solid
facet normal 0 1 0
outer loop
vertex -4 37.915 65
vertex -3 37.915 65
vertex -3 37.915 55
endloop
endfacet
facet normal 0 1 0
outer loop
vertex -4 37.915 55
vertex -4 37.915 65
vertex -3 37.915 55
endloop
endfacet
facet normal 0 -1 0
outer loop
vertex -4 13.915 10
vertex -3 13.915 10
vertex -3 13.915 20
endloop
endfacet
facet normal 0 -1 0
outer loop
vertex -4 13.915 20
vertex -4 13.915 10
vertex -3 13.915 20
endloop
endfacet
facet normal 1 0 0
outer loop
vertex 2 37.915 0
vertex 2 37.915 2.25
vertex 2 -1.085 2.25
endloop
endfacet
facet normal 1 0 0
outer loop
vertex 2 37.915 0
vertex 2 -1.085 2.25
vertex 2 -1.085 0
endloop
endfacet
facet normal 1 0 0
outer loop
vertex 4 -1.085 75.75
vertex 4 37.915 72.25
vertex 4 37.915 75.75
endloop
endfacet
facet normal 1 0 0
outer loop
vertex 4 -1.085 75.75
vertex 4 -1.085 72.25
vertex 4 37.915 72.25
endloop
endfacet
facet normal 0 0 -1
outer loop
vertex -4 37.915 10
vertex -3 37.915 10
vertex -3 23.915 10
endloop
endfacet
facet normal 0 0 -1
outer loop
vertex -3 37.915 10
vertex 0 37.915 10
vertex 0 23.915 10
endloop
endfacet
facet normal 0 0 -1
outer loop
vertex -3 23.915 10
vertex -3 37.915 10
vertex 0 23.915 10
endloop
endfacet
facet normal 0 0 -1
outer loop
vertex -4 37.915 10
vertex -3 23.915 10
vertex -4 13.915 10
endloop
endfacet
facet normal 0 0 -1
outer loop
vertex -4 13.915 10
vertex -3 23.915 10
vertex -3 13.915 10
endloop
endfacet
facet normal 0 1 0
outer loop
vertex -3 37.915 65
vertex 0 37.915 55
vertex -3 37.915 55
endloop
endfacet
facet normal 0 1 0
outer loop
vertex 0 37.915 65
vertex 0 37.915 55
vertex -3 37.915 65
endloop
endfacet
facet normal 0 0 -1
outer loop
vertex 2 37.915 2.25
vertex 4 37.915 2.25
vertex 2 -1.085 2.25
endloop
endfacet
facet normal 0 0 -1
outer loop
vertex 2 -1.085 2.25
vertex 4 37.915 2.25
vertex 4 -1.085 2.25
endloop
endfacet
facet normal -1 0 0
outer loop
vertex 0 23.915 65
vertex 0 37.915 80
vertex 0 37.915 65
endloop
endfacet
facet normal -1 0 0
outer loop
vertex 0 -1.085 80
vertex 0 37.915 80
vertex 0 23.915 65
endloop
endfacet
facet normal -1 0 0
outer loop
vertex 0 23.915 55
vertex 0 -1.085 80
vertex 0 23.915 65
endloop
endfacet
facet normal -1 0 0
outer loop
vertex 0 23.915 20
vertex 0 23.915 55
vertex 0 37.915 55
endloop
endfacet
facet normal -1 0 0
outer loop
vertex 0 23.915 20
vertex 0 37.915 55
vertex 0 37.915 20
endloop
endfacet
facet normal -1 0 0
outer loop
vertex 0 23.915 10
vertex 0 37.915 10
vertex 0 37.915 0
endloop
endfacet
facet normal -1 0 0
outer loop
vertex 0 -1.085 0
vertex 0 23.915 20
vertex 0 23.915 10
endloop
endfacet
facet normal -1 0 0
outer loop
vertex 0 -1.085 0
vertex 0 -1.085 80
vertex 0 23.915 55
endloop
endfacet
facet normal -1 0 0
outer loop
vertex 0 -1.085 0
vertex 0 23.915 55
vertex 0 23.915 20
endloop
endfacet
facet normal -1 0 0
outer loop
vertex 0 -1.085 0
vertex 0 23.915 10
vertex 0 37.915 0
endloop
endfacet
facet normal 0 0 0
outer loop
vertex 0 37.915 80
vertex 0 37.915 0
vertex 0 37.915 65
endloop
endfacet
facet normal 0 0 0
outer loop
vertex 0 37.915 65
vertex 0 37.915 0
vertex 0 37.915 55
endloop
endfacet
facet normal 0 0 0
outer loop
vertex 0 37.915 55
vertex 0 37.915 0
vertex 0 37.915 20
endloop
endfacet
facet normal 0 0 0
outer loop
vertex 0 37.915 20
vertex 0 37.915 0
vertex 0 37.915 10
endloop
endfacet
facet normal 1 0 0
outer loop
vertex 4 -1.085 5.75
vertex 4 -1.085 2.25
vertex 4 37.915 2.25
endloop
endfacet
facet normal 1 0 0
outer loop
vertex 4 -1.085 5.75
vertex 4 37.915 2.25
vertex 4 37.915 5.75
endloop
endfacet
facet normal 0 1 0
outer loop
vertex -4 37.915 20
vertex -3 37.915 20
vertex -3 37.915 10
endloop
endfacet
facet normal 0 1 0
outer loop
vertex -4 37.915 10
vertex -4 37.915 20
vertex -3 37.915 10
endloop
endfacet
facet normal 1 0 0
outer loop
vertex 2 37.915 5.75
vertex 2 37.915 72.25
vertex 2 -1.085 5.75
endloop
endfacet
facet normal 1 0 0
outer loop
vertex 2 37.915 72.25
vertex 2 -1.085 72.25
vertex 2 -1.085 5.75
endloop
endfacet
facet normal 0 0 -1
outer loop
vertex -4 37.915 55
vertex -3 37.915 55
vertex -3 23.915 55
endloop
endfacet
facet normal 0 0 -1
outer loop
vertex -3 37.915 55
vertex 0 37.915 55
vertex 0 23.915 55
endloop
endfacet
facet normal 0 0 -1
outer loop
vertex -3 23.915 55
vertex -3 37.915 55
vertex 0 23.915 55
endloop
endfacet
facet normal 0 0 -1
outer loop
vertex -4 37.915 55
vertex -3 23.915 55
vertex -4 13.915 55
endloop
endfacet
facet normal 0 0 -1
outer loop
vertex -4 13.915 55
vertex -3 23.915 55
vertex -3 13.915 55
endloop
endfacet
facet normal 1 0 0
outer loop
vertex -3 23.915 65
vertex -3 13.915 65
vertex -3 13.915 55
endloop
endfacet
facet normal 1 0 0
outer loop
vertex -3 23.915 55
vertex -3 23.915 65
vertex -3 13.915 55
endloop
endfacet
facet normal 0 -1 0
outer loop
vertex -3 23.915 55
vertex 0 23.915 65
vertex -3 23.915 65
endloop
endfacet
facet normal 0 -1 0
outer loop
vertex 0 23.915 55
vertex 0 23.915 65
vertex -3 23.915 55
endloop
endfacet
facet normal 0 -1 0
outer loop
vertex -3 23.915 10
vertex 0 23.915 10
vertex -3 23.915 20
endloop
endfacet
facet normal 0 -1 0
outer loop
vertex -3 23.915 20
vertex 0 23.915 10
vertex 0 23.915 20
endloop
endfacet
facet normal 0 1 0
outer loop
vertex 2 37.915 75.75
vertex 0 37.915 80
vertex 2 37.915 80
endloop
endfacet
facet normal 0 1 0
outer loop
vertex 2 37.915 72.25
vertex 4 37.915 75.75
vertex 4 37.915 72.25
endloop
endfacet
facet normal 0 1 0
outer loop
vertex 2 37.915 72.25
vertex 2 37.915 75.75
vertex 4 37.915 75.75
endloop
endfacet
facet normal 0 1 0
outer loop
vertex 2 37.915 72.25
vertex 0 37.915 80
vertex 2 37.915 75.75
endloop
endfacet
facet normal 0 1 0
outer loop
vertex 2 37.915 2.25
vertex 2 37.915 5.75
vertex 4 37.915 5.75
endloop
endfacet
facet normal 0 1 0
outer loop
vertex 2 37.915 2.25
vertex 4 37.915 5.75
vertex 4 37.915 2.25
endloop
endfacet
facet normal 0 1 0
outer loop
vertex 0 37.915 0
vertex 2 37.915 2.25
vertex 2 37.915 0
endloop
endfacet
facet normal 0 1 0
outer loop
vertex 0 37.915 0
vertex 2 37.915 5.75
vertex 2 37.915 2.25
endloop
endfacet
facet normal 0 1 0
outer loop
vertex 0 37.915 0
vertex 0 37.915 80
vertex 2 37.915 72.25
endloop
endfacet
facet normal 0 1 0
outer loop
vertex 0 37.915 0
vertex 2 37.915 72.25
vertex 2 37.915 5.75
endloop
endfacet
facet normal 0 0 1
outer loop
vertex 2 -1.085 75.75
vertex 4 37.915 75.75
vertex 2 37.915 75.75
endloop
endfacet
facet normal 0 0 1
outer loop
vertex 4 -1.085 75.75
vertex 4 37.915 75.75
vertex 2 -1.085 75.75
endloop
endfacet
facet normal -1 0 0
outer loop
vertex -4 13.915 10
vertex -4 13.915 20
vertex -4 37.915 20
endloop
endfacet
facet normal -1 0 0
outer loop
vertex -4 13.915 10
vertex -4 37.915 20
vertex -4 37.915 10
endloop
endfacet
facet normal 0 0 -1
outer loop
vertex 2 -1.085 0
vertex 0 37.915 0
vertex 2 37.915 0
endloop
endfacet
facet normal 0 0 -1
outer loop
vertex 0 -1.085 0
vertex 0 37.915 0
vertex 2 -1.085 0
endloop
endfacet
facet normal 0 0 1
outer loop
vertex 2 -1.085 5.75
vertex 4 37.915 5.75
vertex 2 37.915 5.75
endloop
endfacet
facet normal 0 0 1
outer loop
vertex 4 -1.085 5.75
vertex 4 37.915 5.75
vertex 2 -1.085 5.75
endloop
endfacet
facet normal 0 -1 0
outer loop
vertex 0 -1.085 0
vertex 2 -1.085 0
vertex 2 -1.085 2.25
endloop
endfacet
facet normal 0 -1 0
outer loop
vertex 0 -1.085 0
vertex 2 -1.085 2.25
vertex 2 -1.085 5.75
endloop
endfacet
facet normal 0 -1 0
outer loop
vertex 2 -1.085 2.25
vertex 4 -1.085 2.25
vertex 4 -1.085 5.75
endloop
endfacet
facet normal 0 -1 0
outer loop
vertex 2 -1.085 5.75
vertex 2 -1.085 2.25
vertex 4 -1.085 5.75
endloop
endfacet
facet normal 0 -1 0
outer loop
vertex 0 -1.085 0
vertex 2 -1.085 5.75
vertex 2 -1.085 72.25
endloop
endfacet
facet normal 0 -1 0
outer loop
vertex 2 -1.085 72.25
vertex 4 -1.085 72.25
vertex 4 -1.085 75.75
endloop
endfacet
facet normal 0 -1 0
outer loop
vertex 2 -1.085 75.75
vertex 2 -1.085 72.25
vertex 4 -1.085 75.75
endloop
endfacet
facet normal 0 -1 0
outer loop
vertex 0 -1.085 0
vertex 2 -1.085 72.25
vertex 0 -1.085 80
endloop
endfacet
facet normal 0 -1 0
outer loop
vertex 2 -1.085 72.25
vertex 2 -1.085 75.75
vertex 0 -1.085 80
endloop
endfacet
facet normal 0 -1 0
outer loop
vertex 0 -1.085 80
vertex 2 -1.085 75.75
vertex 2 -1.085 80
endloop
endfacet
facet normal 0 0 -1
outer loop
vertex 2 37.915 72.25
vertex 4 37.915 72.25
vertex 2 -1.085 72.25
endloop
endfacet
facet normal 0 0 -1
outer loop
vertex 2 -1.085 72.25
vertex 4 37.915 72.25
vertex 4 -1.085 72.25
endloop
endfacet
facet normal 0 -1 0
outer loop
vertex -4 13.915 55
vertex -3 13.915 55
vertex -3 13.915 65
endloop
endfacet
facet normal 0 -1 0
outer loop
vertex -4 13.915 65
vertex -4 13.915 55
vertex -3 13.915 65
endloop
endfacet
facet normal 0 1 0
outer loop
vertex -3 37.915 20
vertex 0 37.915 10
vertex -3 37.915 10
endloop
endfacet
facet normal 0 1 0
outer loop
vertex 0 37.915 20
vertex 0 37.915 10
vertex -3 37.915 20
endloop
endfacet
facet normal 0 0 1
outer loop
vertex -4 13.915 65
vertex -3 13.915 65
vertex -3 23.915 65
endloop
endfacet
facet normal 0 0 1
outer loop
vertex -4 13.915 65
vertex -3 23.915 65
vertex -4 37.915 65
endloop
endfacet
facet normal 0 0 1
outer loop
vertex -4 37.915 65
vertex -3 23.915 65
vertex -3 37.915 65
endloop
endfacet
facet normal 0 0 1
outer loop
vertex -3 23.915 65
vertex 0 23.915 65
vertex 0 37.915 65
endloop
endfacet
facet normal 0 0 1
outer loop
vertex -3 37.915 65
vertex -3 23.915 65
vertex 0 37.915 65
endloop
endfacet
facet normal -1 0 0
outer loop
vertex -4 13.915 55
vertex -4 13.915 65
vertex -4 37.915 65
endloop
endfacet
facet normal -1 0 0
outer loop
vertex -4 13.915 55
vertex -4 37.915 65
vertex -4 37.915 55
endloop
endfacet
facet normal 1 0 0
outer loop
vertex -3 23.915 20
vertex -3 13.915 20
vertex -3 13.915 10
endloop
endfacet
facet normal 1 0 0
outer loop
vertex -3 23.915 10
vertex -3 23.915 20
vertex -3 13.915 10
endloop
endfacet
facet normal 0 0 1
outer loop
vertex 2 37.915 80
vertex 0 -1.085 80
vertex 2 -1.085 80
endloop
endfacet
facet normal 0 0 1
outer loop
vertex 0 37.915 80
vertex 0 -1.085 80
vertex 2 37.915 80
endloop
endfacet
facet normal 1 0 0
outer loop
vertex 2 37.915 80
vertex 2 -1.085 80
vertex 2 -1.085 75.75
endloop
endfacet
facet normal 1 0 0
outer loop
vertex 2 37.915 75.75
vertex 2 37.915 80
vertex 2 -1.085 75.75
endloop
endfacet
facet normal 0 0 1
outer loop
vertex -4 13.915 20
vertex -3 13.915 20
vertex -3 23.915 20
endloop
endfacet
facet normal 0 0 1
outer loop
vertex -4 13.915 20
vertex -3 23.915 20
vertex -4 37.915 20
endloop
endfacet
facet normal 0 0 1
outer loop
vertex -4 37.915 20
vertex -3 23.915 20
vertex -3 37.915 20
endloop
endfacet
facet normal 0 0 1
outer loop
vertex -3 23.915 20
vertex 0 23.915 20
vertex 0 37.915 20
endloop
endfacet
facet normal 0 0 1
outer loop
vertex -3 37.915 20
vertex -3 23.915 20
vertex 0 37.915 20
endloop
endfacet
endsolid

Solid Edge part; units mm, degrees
sketch "Sketch1" plane through (0, 0, 0) normal (-1, 0, 0) x (0, -1, 0)
  line L0 (2.0853, 0) -> (2.0853, 80)
  line L1 (2.0853, 80) -> (-37.9147, 80)
  line L2 (-37.9147, 80) -> (-37.9147, 0)
  line L3 (-37.9147, 0) -> (2.0853, 0)
extrude "Protrusion1" add sketch "Sketch1" against normal blind 2
sketch "Sketch2" plane through (0, 18.9573, 40) normal (-1, 0, 0) x (0, 0, 1)
  line L0 (-20, 4.9573) -> (-20, 18.9573)
  line L1 (-30, 18.9573) -> (-20, 18.9573)
  line L2 (-30, 18.9573) -> (-30, 4.9573)
  line L3 (-30, 4.9573) -> (-20, 4.9573)
  line L4 (25, 18.9573) -> (25, 4.9573)
  line L5 (25, 4.9573) -> (15, 4.9573)
  line L6 (15, 4.9573) -> (15, 18.9573)
  line L7 (15, 18.9573) -> (25, 18.9573)
extrude "Vysunutí_2" add sketch "Sketch2" along normal blind 3
sketch "Sketch3" plane through (-3, 30.9147, 60) normal (-1, 0, 0) x (0, 0, 1)
  line L0 (5, -17) -> (5, 7)
  line L1 (5, 7) -> (-5, 7)
  line L2 (-5, 7) -> (-5, -17)
  line L3 (-5, -17) -> (5, -17)
  line L4 (-40, -17) -> (-40, 7)
  line L5 (-40, 7) -> (-50, 7)
  line L6 (-50, 7) -> (-50, -17)
  line L7 (-50, -17) -> (-40, -17)
extrude "Vysunutí_3" add sketch "Sketch3" along normal blind 1
sketch "Sketch4" plane through (2, 17.9147, 40) normal (1, 0, 0) x (0, 0, 1)
  line L0 (33, 20) -> (33, -20)
  line L1 (33, -20) -> (35, -20)
  line L2 (35, -20) -> (35, 20)
  line L3 (35, 20) -> (33, 20)
extrude "Protrusion2" add sketch "Sketch4" along normal blind 2
sketch "Sketch5" plane through (2, 17.9147, 36.5) normal (1, 0, 0) x (0, 0, -1)
  line L0 (31.5, 20) -> (31.5, -20)
  line L1 (31.5, -20) -> (33.5, -20)
  line L2 (33.5, -20) -> (33.5, 20)
  line L3 (33.5, 20) -> (31.5, 20)
extrude "Vysunutí_6" add sketch "Sketch5" along normal blind 2
sketch "Sketch6" plane through (2, 17.9147, 39) normal (1, 0, 0) x (0, -1, 0)
  line L0 (19, 39) -> (19, -41)
  line L1 (19, -41) -> (20, -41)
  line L2 (20, -41) -> (20, 39)
  line L3 (20, 39) -> (19, 39)
extrude "Vyříznutí_1" cut sketch "Sketch6" against normal blind 2
sketch "Sketch7" plane through (2, 17.9147, 39) normal (1, 0, 0) x (0, -1, 0)
  line L0 (20, -41) -> (20, 39)
  line L1 (20, 39) -> (19, 39)
  line L2 (19, 39) -> (19, -41)
  line L3 (19, -41) -> (20, -41)
extrude "Vyříznutí_2" cut sketch "Sketch7" along normal blind 2
sketch "Sketch8" plane through (4, 18.4147, 74) normal (1, 0, 0) x (0, -1, 0)
  line L0 (-19.5, -1) -> (-19.5, -1.75)
  line L1 (-19.5, -1.75) -> (19.5, -1.75)
  line L2 (19.5, -1.75) -> (19.5, -1)
  line L3 (19.5, -1) -> (-19.5, -1)
  line L4 (-19.5, 1.75) -> (19.5, 1.75)
  line L5 (19.5, 1.75) -> (19.5, 1)
  line L6 (19.5, 1) -> (-19.5, 1)
  line L7 (-19.5, 1) -> (-19.5, 1.75)
  line L8 (-19.5, 69) -> (-19.5, 68.25)
  line L9 (-19.5, 68.25) -> (19.5, 68.25)
  line L10 (19.5, 68.25) -> (19.5, 69)
  line L11 (19.5, 69) -> (-19.5, 69)
  line L12 (-19.5, 71) -> (-19.5, 71.75)
  line L13 (-19.5, 71.75) -> (19.5, 71.75)
  line L14 (19.5, 71.75) -> (19.5, 71)
  line L15 (19.5, 71) -> (-19.5, 71)
extrude "Protrusion3" add sketch "Sketch8" against normal blind 2
